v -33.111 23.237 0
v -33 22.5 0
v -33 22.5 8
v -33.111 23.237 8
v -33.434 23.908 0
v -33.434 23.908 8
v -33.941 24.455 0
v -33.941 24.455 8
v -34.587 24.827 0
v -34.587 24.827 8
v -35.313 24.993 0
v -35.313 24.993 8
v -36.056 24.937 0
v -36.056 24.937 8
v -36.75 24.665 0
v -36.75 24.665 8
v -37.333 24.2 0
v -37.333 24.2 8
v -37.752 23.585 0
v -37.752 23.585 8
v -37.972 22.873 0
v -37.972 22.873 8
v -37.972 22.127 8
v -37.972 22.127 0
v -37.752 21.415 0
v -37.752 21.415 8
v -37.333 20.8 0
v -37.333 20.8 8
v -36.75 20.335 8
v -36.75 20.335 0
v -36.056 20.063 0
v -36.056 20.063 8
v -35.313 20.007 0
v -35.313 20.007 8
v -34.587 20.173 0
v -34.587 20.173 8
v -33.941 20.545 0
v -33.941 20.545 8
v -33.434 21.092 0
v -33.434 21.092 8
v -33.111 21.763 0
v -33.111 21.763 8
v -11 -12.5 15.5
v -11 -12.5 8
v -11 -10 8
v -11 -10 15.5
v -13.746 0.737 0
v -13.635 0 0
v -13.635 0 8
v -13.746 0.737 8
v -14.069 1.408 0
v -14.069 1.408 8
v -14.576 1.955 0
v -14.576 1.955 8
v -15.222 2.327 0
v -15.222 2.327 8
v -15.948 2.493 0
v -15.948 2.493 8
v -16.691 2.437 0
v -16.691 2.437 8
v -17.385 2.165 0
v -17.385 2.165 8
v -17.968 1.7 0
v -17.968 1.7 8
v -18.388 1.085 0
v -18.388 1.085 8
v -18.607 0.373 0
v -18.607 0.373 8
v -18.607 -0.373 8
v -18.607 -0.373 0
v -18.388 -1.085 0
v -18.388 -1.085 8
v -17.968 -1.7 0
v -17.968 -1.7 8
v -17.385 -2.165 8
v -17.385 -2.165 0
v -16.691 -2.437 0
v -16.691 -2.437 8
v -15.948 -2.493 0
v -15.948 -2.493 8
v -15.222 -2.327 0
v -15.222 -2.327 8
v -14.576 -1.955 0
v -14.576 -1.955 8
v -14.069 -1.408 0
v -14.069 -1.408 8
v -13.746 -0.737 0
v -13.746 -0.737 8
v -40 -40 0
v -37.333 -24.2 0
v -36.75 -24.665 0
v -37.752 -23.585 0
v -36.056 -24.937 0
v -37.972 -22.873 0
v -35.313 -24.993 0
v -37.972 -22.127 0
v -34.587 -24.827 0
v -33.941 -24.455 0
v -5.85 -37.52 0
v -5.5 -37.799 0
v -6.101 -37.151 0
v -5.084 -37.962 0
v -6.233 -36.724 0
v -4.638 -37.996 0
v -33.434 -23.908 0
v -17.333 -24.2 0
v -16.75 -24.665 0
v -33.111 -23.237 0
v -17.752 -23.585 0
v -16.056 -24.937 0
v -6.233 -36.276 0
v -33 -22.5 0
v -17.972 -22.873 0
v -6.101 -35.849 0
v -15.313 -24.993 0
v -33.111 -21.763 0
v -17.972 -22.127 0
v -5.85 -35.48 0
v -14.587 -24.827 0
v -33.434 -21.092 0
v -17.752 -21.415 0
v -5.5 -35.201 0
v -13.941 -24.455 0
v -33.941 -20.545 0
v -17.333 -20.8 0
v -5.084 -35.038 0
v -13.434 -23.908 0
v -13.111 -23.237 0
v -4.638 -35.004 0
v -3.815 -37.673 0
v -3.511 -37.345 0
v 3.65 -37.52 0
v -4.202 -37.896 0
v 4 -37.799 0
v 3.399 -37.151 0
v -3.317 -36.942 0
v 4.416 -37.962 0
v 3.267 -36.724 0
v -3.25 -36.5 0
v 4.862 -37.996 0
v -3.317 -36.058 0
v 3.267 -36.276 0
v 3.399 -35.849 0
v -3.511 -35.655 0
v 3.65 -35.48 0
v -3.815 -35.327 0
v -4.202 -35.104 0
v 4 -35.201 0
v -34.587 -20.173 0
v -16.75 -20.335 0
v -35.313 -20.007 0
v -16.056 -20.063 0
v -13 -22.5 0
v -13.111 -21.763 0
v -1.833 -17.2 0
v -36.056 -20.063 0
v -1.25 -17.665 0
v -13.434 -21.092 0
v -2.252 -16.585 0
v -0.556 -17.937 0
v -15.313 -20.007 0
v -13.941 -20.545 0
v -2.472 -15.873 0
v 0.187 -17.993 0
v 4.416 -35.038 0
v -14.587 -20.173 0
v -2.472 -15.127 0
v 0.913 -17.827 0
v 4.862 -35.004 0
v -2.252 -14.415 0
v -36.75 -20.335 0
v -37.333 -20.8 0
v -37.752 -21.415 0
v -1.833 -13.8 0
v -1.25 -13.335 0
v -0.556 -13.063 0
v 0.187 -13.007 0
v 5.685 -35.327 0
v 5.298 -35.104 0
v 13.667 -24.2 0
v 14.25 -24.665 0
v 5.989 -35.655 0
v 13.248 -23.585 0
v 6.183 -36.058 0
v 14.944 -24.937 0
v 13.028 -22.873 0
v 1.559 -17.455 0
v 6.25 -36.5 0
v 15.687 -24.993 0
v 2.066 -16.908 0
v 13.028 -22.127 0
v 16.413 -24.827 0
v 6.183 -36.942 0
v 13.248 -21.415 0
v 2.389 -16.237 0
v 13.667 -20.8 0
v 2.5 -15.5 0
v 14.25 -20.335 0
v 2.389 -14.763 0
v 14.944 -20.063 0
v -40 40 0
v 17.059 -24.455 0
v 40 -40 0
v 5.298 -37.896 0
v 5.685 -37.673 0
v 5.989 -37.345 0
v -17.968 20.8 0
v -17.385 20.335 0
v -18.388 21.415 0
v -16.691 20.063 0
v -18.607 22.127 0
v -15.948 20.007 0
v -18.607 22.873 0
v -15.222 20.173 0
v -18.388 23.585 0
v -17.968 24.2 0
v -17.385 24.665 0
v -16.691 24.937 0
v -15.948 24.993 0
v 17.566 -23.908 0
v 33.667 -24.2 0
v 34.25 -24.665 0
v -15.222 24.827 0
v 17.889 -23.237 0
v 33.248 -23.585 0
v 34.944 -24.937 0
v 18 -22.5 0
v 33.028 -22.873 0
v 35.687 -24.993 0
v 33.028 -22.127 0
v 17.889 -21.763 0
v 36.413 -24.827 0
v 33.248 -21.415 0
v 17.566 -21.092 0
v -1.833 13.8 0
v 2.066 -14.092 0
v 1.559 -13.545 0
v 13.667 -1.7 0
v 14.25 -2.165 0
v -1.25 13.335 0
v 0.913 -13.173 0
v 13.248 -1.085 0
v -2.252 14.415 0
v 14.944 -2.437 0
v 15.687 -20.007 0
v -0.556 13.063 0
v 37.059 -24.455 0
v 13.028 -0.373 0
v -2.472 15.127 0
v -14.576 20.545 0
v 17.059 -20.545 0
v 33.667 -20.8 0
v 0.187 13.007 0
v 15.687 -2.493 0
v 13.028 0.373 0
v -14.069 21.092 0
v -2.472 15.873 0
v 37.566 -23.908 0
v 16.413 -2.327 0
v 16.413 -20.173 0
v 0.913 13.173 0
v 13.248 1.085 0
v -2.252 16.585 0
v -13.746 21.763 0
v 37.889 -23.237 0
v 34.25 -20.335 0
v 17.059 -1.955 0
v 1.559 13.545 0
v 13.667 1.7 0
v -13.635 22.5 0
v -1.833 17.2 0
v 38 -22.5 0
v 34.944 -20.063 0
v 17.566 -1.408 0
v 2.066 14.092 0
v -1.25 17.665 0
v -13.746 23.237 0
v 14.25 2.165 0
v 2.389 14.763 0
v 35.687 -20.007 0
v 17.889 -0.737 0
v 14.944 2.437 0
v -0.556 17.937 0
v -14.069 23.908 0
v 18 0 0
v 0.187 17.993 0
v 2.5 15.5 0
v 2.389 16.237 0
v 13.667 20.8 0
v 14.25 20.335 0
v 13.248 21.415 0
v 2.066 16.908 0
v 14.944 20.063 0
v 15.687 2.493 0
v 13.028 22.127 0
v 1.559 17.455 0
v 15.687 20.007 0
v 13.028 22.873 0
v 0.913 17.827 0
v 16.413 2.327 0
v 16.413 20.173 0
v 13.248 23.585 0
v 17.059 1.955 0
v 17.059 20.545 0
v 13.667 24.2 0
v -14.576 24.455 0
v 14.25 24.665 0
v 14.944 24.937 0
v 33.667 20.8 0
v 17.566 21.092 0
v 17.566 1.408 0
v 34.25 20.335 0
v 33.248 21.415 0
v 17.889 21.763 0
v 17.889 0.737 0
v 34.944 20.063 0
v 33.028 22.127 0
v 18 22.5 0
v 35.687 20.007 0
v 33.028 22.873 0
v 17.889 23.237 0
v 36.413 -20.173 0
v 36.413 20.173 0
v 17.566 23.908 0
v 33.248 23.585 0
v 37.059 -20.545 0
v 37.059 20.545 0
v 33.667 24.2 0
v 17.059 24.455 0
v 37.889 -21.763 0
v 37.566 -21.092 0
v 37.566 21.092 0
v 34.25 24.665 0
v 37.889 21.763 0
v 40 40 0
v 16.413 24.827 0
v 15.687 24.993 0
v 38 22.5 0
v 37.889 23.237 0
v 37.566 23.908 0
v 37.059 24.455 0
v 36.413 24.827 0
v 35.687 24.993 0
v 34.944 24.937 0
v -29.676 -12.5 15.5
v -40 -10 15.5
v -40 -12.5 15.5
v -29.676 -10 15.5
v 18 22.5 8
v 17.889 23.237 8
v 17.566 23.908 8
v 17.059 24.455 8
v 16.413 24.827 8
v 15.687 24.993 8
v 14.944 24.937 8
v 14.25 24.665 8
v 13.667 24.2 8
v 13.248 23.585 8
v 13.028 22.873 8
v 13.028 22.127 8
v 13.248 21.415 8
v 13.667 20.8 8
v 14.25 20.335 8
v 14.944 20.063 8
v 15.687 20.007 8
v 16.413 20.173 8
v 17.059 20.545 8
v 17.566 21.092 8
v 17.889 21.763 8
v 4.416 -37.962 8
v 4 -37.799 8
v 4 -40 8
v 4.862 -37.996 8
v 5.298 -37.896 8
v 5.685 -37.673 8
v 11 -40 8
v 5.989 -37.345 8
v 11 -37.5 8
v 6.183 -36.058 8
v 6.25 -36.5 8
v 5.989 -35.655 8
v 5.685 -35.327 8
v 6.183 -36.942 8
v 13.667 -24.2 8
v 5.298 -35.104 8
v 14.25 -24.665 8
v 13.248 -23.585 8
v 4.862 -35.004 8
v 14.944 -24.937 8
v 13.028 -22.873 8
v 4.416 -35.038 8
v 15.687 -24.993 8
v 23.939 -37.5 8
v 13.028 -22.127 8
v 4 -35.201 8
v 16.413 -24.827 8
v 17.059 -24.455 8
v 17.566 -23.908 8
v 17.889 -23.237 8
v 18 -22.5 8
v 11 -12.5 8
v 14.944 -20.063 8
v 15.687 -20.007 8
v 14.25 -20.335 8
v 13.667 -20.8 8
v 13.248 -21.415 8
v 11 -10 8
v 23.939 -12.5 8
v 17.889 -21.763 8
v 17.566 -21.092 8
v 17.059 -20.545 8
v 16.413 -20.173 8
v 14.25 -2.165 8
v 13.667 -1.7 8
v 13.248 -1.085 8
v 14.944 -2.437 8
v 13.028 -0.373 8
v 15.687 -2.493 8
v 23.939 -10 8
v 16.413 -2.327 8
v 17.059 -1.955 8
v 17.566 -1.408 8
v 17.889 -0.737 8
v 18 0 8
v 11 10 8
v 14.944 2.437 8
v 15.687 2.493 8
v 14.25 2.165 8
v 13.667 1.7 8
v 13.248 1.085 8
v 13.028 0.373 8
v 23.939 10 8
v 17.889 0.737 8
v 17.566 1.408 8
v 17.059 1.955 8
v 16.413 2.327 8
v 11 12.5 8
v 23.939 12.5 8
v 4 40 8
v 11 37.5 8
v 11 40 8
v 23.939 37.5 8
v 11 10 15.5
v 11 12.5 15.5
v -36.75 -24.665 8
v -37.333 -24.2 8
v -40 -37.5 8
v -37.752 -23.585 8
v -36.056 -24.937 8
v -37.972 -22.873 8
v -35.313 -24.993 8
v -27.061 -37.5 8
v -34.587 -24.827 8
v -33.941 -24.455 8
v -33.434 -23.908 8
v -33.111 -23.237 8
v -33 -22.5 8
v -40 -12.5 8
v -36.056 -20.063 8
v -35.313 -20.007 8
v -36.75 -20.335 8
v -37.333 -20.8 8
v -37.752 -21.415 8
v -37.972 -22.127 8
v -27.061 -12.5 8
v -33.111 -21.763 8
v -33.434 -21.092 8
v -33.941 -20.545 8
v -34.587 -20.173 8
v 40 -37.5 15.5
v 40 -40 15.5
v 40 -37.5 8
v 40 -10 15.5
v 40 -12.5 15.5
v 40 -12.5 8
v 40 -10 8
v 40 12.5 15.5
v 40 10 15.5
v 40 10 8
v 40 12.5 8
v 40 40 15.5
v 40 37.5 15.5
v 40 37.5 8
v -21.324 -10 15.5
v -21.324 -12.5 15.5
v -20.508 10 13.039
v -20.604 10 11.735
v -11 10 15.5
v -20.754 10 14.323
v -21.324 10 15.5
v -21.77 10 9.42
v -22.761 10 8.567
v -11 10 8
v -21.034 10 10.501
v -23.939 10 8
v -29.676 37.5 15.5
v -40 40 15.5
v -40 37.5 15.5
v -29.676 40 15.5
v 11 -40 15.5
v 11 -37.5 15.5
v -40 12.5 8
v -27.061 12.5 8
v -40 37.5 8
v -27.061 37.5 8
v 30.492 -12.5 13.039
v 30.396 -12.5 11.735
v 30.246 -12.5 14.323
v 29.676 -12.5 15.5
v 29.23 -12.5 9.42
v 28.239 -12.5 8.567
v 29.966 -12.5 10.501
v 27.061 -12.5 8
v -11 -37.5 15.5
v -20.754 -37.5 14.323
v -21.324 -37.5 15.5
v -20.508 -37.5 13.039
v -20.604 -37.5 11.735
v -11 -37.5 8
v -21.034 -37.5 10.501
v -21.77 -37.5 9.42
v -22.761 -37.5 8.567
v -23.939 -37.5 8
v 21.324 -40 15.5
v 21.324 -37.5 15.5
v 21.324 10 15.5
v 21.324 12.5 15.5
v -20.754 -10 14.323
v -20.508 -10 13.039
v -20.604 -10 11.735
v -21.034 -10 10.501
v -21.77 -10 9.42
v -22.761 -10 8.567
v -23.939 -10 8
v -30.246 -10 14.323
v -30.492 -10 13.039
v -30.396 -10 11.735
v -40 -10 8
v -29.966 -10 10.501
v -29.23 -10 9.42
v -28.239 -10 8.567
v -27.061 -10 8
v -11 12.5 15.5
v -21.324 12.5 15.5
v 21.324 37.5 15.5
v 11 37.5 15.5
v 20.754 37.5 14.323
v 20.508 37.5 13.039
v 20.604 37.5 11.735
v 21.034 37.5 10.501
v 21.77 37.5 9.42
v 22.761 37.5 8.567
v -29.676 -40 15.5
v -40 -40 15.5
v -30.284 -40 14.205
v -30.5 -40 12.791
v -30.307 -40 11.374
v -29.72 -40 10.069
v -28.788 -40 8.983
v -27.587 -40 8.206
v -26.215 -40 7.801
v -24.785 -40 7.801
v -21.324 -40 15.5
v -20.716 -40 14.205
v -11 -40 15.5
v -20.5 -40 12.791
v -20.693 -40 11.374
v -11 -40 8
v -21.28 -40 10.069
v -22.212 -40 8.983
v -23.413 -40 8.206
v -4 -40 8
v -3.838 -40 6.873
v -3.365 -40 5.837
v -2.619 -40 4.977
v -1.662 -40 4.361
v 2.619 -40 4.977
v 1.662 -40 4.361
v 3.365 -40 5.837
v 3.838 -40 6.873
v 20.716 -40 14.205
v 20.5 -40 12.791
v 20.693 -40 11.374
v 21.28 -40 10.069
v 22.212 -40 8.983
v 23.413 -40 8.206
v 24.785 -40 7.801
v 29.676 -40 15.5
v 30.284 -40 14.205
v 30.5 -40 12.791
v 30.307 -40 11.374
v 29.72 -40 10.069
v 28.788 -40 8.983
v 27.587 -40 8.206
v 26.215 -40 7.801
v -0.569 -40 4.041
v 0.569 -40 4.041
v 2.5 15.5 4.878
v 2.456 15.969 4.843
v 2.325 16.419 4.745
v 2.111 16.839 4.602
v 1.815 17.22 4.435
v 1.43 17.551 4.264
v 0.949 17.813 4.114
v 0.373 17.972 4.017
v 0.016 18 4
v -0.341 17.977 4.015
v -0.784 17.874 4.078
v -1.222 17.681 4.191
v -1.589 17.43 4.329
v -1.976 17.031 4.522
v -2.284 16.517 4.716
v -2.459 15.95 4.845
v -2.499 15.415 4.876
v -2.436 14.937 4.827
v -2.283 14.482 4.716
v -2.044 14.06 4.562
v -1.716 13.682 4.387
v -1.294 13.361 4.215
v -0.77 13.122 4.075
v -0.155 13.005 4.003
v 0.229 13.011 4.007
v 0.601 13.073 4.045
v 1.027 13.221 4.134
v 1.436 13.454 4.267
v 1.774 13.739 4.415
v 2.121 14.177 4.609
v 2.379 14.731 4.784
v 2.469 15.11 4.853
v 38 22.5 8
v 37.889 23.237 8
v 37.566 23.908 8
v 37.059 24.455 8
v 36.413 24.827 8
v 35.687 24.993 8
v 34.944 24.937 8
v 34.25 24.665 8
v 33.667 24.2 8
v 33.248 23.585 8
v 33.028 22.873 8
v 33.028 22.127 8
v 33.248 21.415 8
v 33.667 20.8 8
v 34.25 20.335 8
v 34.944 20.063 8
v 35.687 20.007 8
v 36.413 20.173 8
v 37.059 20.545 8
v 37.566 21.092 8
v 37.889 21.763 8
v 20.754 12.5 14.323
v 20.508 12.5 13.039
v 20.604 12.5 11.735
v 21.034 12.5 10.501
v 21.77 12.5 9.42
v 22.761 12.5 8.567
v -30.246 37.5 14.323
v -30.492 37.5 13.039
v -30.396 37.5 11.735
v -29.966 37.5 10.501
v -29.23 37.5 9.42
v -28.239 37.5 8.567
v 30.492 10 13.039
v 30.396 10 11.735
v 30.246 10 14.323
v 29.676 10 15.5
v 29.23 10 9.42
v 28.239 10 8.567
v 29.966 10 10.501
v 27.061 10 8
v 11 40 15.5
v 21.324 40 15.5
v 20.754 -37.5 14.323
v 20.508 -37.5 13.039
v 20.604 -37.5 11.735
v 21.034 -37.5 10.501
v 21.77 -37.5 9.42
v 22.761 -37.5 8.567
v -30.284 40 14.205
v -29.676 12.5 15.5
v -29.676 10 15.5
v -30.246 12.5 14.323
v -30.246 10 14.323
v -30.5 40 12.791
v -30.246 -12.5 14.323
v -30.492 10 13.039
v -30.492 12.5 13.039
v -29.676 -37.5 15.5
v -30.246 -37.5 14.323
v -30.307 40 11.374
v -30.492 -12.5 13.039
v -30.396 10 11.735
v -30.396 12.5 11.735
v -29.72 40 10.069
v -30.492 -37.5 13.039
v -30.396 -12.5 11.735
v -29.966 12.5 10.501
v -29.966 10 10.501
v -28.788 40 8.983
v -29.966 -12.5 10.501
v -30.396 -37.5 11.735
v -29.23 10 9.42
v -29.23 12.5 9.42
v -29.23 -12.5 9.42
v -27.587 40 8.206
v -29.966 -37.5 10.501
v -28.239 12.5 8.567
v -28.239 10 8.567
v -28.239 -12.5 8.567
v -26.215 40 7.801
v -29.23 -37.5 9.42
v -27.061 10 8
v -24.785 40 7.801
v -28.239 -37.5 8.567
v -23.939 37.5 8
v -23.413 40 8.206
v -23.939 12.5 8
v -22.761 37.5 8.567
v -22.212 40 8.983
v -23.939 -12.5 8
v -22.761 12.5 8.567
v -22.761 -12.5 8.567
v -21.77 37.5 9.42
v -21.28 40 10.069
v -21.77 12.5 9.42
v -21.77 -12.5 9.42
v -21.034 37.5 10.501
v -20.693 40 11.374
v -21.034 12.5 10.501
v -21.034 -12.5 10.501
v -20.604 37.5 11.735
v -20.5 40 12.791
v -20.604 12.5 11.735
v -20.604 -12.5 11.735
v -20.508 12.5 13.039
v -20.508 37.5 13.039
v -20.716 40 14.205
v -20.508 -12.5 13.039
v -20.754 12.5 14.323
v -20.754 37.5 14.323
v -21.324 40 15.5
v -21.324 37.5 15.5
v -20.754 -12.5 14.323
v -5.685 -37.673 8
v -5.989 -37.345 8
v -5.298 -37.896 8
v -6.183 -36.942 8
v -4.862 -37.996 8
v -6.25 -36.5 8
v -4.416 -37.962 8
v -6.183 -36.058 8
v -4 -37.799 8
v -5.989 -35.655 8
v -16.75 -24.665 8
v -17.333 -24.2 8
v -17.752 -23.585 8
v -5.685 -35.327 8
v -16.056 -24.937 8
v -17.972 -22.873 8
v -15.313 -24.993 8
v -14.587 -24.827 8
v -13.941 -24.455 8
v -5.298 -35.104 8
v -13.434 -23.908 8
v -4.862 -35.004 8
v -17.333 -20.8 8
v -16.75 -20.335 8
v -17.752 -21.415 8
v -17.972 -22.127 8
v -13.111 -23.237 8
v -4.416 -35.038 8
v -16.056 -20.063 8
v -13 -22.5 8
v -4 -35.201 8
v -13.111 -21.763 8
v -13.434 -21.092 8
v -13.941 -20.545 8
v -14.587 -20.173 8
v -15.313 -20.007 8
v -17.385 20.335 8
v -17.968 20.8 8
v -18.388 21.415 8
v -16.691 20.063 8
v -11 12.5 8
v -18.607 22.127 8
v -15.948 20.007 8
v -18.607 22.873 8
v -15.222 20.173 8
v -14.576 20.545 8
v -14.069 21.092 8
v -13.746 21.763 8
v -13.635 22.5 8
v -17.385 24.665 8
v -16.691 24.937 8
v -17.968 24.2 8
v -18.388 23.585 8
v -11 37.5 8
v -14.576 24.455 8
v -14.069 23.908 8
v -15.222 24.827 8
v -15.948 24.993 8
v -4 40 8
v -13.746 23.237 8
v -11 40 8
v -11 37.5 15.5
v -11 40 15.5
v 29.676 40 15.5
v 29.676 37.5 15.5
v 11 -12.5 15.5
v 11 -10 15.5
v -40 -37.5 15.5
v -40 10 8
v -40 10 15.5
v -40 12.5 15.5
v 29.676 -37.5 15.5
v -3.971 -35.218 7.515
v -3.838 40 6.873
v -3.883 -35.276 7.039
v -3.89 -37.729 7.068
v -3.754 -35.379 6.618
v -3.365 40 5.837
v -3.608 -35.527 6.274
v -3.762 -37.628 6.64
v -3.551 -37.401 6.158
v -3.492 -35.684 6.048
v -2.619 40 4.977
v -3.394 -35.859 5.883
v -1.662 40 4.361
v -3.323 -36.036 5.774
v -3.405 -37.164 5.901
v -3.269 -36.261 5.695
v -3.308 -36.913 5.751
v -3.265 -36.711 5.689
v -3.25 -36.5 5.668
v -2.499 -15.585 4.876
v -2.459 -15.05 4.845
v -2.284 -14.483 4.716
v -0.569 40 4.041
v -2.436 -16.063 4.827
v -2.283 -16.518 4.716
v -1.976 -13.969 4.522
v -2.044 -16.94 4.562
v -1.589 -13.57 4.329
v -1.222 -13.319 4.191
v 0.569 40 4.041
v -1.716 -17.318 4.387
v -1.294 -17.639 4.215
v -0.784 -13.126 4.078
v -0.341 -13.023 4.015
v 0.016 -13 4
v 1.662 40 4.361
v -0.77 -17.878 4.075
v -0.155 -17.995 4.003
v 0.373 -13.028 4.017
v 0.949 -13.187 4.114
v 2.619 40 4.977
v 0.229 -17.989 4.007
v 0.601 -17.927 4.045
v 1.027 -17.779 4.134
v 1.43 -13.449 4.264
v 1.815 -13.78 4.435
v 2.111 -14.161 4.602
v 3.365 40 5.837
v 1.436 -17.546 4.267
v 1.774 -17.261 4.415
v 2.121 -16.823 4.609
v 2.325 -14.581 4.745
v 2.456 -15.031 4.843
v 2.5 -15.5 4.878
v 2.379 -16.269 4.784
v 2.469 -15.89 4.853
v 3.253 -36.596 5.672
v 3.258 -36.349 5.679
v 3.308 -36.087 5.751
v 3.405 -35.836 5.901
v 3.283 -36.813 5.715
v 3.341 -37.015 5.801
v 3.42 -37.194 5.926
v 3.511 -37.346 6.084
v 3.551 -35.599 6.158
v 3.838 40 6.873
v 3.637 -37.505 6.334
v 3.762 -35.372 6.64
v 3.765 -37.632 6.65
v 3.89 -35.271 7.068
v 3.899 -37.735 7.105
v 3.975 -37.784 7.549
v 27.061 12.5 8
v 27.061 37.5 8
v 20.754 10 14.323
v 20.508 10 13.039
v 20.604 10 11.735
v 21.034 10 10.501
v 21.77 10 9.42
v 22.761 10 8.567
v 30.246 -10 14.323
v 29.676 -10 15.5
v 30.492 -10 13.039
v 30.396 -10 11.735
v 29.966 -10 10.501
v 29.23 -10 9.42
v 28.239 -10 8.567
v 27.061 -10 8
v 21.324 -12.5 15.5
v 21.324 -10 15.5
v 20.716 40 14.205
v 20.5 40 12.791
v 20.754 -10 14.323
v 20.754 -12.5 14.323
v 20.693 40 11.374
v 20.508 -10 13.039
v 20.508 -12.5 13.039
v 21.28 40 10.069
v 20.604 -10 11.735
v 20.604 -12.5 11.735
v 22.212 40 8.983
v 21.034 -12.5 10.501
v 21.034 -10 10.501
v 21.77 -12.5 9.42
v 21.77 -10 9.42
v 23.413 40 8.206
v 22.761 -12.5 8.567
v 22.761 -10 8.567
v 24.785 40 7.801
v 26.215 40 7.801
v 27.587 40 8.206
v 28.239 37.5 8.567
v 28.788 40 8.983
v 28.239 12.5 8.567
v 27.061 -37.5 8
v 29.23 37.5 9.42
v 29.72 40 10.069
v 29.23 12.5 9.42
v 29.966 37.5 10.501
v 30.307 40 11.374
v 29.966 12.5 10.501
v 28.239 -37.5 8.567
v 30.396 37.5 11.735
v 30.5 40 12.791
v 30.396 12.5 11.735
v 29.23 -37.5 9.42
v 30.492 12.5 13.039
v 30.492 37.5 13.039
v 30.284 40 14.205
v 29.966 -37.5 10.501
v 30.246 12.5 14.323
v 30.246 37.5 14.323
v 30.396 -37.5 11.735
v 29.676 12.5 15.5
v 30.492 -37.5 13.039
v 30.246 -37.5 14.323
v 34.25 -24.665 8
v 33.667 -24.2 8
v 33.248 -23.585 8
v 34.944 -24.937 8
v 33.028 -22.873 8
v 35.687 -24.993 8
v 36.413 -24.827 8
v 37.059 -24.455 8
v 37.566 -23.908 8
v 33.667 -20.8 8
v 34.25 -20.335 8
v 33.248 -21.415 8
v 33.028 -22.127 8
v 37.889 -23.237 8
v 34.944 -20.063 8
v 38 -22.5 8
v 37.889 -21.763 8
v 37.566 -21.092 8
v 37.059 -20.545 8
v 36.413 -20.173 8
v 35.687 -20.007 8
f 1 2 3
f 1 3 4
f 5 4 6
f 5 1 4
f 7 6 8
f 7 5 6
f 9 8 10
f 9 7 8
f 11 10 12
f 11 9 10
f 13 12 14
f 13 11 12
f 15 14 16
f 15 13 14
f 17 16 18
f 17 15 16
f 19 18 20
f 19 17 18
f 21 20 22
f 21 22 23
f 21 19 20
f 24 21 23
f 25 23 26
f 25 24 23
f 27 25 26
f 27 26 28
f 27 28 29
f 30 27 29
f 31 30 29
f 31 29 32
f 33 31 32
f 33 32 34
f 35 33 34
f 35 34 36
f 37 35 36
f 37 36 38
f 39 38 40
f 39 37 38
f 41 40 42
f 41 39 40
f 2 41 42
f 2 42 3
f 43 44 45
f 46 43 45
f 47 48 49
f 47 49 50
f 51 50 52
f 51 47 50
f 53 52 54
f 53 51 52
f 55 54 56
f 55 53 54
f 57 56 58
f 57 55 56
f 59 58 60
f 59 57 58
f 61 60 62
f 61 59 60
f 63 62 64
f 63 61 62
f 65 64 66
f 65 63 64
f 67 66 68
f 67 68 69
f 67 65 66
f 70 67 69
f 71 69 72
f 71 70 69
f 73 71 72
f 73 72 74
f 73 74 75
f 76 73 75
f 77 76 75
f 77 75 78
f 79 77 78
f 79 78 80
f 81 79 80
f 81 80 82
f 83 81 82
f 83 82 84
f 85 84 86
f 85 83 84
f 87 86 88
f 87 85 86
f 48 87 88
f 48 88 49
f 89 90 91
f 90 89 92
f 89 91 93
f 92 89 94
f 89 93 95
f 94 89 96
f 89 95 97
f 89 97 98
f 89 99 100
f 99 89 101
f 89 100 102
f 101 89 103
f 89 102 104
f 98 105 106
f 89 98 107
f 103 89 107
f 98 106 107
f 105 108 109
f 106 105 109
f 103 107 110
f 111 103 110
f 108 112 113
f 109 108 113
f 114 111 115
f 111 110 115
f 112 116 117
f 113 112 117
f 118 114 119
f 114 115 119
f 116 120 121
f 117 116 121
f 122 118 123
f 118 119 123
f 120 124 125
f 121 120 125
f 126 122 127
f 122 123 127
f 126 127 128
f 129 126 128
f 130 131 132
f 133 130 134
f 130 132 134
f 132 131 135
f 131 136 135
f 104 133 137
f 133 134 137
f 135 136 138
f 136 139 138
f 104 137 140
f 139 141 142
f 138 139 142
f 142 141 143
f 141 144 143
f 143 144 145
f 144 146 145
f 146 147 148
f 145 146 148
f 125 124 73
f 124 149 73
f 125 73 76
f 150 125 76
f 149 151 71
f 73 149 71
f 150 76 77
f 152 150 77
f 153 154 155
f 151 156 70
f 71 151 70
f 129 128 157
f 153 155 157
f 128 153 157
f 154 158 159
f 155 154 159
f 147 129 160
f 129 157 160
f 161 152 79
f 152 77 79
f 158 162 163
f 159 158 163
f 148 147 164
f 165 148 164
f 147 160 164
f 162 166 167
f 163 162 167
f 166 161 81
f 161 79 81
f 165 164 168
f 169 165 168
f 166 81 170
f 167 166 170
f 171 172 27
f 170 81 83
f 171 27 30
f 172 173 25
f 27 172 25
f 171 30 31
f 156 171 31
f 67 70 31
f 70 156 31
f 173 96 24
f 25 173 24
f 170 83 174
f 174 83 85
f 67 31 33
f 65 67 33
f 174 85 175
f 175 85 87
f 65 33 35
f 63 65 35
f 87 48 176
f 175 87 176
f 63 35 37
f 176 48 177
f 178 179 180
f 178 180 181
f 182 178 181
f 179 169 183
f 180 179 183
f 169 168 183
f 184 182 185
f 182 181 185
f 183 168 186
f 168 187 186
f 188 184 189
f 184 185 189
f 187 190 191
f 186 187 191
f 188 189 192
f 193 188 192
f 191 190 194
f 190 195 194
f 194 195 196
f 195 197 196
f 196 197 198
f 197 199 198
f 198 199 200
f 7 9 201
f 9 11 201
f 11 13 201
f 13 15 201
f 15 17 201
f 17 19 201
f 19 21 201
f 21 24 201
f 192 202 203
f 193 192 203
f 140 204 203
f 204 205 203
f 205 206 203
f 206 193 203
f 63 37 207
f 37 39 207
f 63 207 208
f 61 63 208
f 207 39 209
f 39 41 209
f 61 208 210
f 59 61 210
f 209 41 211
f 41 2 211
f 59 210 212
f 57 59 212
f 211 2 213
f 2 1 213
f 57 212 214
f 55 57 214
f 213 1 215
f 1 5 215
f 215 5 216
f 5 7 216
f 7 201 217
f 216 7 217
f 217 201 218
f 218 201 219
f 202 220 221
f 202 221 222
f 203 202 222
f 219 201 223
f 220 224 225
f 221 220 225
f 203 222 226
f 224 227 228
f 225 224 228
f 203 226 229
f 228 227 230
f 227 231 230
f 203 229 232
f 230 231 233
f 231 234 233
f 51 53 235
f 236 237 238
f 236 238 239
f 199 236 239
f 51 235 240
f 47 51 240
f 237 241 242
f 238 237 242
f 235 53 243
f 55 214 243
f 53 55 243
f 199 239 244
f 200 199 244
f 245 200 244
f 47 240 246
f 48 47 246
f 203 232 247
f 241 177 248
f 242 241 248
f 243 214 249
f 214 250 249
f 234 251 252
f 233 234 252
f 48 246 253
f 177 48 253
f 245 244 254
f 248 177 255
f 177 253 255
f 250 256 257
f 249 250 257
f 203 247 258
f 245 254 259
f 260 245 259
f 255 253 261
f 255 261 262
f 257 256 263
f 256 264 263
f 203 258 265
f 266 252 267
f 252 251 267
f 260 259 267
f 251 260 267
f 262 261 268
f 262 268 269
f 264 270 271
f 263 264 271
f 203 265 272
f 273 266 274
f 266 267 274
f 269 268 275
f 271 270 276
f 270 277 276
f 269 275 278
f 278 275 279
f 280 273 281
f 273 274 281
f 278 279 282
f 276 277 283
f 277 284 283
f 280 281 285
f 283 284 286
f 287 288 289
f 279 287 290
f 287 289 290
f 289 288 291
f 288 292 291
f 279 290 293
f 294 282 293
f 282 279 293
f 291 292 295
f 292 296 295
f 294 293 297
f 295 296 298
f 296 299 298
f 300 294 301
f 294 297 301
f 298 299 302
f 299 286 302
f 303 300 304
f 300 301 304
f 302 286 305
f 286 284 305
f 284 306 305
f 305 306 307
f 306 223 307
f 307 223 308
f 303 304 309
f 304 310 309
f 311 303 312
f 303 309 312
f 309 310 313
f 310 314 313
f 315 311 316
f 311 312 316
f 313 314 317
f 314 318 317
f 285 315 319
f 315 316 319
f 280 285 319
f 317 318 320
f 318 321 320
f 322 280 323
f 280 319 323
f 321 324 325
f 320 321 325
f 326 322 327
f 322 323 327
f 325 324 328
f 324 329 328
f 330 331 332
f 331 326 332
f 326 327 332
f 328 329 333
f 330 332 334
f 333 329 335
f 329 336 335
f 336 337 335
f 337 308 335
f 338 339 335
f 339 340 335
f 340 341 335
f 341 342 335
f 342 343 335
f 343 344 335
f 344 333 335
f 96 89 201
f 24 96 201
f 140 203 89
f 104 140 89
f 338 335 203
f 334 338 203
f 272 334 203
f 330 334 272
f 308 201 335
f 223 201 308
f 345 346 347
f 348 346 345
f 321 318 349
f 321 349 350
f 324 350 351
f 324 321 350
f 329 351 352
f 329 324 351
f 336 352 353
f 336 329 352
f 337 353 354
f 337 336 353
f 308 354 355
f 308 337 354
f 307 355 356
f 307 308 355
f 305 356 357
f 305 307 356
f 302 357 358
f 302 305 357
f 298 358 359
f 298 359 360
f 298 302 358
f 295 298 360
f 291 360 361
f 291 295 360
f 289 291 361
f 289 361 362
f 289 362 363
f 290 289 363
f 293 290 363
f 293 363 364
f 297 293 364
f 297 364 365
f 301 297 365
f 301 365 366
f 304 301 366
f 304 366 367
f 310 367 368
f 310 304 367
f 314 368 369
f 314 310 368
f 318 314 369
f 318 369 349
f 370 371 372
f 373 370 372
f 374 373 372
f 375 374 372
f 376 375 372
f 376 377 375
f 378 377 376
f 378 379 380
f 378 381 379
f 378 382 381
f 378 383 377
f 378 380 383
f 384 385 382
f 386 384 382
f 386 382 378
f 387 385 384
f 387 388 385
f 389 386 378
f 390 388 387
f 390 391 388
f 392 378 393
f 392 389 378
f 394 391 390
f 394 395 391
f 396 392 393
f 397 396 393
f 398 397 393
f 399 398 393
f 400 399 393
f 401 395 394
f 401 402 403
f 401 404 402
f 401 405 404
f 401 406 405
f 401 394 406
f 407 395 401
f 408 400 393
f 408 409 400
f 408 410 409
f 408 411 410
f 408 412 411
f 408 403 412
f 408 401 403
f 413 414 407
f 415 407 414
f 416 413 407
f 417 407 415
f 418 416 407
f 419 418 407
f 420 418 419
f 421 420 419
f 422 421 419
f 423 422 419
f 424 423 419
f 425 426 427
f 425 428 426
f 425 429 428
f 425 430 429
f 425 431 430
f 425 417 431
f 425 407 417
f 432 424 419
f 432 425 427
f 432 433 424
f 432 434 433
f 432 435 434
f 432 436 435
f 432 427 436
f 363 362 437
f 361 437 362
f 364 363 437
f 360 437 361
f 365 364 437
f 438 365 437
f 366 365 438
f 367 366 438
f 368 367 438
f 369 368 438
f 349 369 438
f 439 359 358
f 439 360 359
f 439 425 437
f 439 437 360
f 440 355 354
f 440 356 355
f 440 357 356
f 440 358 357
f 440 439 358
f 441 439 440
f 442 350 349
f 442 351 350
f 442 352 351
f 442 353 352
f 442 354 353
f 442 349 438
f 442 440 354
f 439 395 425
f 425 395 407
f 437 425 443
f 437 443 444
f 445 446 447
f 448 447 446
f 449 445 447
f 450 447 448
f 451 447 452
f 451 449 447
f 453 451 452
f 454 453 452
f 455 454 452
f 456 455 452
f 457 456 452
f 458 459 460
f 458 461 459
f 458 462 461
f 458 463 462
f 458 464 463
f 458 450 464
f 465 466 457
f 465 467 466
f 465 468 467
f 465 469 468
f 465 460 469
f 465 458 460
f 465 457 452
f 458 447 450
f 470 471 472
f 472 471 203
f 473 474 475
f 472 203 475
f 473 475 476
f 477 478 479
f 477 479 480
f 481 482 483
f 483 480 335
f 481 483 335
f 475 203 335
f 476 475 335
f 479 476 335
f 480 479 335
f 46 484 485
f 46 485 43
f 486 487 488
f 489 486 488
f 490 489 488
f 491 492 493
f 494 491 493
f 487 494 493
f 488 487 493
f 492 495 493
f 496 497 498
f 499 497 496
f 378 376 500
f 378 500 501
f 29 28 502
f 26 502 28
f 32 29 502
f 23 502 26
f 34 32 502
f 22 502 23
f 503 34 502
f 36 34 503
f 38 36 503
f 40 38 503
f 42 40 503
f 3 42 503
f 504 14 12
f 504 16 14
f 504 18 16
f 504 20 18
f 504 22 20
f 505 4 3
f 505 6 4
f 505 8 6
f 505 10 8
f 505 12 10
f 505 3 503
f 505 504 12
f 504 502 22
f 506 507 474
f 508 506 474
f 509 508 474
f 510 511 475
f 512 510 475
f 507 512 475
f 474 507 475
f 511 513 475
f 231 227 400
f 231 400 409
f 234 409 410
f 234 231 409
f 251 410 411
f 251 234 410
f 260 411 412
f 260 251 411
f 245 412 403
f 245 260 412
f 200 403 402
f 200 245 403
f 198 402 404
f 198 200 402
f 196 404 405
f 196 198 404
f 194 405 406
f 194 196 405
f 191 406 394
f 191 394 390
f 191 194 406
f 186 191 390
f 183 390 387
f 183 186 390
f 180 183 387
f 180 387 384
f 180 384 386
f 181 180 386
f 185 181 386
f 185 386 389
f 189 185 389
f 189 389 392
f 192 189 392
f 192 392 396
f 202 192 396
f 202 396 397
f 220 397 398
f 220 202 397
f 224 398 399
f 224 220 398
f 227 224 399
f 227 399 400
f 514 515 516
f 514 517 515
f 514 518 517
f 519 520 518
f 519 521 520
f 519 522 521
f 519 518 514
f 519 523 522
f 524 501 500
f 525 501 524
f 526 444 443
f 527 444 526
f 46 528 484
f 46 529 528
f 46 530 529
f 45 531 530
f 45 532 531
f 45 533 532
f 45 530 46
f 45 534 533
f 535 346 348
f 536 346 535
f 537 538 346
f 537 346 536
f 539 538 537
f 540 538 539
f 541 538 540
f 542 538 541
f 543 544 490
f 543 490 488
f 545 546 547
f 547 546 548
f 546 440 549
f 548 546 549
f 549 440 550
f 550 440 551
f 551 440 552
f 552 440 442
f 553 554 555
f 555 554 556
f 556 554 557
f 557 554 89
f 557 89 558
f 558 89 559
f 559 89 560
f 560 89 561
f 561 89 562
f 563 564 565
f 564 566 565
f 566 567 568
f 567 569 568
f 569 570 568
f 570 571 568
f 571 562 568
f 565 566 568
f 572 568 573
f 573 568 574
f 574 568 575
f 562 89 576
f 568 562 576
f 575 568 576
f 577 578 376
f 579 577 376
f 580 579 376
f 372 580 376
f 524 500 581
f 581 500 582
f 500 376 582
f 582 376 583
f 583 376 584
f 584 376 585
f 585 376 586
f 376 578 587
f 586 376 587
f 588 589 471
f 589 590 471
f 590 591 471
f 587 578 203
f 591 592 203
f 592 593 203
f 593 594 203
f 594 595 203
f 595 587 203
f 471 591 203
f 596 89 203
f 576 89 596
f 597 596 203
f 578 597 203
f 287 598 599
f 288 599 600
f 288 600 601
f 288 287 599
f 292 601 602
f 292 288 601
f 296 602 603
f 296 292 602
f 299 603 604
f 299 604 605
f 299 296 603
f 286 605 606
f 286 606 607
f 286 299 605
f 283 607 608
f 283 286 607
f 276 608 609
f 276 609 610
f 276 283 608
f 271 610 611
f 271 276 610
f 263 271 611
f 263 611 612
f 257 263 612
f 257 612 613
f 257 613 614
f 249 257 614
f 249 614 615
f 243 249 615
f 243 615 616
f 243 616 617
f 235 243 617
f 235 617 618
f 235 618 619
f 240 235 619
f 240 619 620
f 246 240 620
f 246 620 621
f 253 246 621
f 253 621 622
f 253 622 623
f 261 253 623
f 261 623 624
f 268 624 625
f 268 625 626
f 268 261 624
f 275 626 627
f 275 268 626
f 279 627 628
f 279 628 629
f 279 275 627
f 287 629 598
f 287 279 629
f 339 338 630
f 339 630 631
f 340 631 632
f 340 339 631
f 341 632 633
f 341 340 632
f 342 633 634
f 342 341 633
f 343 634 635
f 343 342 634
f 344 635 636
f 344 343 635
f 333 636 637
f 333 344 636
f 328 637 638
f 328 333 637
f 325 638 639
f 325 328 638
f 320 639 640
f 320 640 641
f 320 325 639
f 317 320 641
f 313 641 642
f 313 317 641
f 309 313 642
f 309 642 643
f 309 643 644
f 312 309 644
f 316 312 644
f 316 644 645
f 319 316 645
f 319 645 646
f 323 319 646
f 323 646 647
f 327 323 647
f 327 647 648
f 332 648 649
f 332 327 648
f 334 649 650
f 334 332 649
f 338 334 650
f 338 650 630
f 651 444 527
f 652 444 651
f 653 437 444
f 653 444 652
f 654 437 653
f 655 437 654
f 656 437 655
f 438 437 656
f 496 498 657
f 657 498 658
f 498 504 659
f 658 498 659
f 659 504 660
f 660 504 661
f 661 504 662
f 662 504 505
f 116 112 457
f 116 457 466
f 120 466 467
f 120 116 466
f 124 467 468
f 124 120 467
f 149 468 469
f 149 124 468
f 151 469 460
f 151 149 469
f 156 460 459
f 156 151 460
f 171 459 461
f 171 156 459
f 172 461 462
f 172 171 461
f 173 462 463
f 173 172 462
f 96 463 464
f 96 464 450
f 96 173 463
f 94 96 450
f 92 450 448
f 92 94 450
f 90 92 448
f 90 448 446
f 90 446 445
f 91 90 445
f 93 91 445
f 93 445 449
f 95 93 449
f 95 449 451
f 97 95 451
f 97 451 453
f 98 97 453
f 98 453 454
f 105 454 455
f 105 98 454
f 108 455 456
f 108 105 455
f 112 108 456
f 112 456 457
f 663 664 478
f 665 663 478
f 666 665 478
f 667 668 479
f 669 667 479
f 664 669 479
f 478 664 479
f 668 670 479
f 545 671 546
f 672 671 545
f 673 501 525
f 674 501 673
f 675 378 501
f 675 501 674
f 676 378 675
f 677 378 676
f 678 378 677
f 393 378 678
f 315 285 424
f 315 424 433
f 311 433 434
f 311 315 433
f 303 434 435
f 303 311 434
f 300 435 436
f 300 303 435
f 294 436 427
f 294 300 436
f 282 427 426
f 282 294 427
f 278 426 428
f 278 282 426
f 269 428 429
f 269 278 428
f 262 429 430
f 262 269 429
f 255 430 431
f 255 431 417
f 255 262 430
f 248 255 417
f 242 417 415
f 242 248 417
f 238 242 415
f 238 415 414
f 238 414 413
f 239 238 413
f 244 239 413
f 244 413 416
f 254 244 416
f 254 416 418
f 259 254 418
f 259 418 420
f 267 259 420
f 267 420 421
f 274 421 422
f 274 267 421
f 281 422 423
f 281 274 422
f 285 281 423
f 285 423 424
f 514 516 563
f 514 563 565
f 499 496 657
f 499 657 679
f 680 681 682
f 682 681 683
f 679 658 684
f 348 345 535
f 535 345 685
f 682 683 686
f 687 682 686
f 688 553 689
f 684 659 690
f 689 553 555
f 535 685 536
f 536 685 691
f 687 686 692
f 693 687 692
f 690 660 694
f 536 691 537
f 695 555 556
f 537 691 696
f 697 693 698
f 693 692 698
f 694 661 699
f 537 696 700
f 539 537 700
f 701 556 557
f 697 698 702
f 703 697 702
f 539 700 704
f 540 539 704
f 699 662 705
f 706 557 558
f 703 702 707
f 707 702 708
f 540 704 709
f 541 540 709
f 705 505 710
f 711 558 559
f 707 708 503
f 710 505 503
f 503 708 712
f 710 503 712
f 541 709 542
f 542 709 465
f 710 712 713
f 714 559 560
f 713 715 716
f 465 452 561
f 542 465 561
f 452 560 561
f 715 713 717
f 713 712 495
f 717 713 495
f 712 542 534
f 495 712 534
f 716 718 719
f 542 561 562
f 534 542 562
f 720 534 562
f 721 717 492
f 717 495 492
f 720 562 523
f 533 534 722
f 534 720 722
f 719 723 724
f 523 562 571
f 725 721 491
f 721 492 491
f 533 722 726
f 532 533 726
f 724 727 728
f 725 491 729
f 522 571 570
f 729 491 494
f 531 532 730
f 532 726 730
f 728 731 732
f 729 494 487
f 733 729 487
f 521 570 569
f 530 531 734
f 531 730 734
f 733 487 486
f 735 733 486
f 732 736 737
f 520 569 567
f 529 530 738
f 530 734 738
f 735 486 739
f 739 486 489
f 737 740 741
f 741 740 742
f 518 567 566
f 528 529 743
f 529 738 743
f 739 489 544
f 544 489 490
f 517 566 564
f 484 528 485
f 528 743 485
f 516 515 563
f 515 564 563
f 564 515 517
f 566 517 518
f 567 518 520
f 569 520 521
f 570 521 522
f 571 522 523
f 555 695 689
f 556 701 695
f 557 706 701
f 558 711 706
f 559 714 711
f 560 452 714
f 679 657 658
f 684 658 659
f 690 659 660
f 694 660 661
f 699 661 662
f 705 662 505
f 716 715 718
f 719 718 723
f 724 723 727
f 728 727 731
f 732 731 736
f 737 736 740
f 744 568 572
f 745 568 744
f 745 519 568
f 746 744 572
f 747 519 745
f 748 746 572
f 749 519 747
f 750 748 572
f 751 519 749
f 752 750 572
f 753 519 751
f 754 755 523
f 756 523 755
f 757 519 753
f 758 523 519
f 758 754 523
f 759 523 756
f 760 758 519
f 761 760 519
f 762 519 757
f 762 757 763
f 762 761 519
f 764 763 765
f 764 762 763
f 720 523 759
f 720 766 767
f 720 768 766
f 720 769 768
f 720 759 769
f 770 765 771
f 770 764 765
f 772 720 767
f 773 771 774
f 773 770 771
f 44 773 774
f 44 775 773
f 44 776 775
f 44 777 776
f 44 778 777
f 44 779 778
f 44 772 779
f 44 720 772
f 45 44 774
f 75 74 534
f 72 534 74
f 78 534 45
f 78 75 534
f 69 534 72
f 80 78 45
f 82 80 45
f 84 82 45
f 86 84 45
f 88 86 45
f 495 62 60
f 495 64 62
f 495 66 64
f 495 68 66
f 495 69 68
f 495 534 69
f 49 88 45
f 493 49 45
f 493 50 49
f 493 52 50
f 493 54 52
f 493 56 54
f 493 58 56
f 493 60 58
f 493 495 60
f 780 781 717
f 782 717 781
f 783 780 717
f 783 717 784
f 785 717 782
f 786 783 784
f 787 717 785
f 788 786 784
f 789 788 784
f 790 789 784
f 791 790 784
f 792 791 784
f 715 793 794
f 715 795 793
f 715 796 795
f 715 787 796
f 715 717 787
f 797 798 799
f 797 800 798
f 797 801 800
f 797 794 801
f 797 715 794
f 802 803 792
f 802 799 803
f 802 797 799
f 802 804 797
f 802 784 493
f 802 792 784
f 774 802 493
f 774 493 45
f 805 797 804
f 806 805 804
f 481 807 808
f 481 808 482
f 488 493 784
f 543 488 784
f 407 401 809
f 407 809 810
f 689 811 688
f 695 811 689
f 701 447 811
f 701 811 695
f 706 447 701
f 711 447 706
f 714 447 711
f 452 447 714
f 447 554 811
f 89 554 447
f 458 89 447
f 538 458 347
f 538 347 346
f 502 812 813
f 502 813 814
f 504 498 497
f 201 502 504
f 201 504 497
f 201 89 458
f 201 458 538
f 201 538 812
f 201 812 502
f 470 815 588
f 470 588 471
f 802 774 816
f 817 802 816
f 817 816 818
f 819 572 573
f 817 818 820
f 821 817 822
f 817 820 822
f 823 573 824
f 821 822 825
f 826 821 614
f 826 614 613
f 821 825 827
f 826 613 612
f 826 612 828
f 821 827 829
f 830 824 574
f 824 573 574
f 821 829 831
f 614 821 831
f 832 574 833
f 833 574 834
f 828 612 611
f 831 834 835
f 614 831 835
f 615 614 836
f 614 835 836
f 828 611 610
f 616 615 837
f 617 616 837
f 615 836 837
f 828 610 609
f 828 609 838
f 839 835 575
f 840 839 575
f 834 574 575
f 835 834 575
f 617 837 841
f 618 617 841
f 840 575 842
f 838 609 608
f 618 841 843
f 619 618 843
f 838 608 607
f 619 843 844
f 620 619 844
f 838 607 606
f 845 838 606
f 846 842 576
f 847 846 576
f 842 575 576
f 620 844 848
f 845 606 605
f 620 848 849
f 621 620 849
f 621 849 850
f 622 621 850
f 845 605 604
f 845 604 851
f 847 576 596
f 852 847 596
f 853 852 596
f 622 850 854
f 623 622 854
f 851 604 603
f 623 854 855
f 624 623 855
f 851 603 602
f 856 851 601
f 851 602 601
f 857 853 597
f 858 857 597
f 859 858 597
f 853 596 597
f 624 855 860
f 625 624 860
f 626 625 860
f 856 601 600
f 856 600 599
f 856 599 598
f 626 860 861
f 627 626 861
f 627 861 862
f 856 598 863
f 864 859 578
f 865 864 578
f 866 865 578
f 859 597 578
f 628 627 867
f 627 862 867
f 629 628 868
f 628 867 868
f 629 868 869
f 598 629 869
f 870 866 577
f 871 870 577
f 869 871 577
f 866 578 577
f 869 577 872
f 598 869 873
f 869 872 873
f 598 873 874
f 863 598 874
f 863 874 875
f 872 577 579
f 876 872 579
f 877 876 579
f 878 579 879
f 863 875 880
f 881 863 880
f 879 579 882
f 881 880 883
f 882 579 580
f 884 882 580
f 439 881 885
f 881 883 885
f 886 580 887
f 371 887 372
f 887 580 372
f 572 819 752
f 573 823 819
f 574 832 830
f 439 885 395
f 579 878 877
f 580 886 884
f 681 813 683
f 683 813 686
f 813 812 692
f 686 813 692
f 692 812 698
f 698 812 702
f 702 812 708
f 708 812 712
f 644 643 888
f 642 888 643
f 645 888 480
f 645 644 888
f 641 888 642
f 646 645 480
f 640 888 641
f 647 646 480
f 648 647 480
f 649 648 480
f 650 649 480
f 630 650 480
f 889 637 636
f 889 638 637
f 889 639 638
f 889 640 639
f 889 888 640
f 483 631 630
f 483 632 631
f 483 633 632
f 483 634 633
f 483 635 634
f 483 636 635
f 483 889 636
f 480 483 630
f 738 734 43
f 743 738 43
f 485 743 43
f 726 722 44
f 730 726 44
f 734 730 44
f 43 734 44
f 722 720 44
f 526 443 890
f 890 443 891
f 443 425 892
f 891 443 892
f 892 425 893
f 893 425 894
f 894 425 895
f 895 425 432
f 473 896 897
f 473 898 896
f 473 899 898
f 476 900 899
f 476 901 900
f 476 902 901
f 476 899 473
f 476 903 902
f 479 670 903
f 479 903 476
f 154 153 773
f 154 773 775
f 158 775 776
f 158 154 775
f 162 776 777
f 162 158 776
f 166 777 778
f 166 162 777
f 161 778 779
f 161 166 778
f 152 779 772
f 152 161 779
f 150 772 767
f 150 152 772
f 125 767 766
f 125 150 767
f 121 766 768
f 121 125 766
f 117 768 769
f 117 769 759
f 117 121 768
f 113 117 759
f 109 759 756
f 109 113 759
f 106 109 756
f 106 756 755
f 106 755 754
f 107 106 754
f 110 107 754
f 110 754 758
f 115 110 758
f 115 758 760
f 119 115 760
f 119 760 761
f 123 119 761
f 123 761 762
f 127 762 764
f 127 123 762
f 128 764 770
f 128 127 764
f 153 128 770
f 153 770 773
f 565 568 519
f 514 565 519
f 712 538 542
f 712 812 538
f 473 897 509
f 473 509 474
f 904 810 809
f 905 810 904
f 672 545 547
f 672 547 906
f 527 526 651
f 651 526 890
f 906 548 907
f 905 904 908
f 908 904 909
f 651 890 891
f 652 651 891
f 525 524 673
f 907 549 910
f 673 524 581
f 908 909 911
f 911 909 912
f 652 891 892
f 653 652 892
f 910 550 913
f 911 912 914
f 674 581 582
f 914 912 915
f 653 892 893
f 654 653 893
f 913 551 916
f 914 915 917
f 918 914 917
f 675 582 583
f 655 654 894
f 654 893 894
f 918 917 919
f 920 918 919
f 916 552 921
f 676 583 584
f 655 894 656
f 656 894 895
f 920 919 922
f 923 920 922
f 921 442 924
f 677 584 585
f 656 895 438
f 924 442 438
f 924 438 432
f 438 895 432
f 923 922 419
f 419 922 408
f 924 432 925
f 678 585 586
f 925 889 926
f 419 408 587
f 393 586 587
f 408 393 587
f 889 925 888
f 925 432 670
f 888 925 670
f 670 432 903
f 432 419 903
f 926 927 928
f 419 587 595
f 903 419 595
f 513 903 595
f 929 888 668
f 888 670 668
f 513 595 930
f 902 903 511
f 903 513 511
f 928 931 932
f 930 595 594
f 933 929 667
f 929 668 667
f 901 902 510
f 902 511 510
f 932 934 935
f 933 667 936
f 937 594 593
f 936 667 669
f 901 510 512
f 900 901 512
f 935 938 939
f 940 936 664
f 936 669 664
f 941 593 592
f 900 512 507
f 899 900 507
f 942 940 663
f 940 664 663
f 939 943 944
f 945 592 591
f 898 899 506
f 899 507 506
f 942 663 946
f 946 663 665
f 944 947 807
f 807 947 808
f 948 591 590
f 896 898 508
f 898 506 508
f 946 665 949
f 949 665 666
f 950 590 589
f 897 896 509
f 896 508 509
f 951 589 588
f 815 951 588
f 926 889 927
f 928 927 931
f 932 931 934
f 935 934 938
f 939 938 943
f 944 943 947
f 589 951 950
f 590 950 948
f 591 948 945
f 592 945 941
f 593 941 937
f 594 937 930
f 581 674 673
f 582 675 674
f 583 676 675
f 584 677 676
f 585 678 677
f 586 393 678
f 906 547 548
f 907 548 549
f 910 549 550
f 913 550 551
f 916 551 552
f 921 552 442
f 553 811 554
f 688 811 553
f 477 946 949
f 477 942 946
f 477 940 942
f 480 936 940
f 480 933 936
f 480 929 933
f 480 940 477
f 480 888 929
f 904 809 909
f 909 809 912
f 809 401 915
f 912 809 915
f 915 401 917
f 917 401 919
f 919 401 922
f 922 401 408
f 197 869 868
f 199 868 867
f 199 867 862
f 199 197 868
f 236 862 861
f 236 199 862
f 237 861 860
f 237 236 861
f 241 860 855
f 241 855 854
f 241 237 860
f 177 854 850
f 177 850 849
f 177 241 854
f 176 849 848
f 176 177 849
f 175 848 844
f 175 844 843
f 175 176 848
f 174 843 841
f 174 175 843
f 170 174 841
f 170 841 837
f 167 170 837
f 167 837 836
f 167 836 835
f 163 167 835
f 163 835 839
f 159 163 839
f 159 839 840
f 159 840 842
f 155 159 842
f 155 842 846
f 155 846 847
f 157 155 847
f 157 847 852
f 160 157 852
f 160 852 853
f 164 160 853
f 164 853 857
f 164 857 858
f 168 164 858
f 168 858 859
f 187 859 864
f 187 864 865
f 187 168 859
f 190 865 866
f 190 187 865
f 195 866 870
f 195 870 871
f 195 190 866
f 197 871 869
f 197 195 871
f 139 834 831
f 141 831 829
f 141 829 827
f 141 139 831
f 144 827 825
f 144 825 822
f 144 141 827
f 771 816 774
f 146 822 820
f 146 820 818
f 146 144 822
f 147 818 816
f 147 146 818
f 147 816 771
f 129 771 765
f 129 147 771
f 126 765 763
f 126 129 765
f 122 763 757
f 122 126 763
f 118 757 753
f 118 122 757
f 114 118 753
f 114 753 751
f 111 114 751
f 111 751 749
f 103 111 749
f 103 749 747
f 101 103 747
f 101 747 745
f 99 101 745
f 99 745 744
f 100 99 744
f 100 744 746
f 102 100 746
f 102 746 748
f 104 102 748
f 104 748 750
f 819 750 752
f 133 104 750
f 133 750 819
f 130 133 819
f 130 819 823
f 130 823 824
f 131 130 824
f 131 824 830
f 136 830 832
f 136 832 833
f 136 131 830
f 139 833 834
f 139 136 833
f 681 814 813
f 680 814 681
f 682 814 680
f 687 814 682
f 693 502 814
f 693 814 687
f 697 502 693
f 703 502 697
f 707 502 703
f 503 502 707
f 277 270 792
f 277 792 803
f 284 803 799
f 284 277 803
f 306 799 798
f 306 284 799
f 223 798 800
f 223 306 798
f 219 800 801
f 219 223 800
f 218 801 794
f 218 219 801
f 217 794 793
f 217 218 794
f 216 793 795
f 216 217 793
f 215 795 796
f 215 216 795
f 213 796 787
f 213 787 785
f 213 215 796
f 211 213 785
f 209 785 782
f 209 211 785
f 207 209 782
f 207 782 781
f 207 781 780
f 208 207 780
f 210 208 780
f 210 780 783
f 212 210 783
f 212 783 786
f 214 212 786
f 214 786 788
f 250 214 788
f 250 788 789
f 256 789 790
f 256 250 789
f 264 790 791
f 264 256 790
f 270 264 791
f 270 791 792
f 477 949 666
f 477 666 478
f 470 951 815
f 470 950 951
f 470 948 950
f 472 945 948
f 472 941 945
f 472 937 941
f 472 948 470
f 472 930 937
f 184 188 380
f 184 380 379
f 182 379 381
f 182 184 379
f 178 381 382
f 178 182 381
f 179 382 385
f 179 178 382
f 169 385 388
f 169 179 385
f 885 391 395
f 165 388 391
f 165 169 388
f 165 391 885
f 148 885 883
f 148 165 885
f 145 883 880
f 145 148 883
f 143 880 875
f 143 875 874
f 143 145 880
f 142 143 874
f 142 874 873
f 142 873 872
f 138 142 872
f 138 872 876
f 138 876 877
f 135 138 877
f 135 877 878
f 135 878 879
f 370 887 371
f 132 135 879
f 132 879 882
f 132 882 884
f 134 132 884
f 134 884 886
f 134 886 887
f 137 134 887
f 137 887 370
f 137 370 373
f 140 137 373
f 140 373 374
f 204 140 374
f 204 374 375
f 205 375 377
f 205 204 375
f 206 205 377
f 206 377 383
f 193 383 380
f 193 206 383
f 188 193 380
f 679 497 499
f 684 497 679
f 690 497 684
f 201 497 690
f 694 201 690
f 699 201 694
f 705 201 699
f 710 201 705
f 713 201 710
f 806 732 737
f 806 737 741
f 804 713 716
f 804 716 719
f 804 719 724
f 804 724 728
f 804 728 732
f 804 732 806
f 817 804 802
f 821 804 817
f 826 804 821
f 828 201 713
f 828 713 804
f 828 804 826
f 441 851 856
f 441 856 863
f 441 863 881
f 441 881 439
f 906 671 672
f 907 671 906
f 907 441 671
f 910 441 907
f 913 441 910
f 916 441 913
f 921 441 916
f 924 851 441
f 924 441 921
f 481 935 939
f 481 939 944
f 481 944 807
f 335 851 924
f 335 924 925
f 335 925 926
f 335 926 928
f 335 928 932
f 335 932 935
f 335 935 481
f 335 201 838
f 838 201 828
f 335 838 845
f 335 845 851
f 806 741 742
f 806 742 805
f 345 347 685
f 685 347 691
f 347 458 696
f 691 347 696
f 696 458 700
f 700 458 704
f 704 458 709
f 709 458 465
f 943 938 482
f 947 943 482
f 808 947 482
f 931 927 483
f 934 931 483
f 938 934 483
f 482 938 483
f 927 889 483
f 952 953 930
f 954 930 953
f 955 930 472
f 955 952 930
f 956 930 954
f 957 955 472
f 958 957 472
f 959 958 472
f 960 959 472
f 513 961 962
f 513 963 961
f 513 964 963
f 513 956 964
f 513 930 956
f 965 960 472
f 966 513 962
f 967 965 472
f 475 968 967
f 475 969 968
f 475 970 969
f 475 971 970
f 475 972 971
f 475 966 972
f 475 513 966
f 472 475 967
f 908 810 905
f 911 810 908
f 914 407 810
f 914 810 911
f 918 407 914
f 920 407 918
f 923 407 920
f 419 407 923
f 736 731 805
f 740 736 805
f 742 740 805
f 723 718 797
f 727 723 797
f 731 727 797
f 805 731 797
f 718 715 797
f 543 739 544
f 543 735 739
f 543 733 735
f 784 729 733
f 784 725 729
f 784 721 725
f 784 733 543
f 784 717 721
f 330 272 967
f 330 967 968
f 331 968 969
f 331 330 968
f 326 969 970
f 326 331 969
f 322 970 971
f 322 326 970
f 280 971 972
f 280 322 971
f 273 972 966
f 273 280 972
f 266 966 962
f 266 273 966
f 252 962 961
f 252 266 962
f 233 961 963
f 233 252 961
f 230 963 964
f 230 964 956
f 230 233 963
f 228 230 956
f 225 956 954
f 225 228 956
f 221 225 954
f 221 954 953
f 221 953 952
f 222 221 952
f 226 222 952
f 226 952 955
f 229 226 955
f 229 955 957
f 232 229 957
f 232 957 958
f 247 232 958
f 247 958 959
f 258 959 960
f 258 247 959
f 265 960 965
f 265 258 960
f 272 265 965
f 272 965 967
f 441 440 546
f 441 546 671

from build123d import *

# Parameters (mm, degrees)
F0_W     = 80
F0_H     = 80
F0_R     = 2.5
F0_R_2   = 1.5
F1_DEPTH = 8
F2_W     = 29
F2_H     = 2.5
F3_DEPTH = 7.5
F5_D     = 10
F7_D     = 8


with BuildPart() as f1:
    # F0 (on Top) → F1 (new body)
    with BuildSketch(Plane.XY):
        Rectangle(F0_W, F0_H)
        with Locations((-35.5, -22.5)):
            Circle(F0_R, mode=Mode.SUBTRACT)
        with Locations((-4.75, -36.5)):
            Circle(F0_R_2, mode=Mode.SUBTRACT)
        with Locations((-15.5, -22.5)):
            Circle(F0_R, mode=Mode.SUBTRACT)
        with Locations((4.75, -36.5)):
            Circle(F0_R_2, mode=Mode.SUBTRACT)
        with Locations((15.5, -22.5)):
            Circle(F0_R, mode=Mode.SUBTRACT)
        with Locations((35.5, -22.5)):
            Circle(F0_R, mode=Mode.SUBTRACT)
        with Locations((0, -15.5)):
            Circle(F0_R, mode=Mode.SUBTRACT)
        with Locations((-16.135083, 0)):
            Circle(F0_R, mode=Mode.SUBTRACT)
        with Locations((-35.5, 22.5)):
            Circle(F0_R, mode=Mode.SUBTRACT)
        with Locations((-16.135083, 22.5)):
            Circle(F0_R, mode=Mode.SUBTRACT)
        with Locations((15.5, 0)):
            Circle(F0_R, mode=Mode.SUBTRACT)
        with Locations((0, 15.5)):
            Circle(F0_R, mode=Mode.SUBTRACT)
        with Locations((15.5, 22.5)):
            Circle(F0_R, mode=Mode.SUBTRACT)
        with Locations((35.5, 22.5)):
            Circle(F0_R, mode=Mode.SUBTRACT)
    extrude(amount=F1_DEPTH)

    # F2 (on face) → F3 (join)
    with BuildSketch(Plane.XY.offset(8)):
        with Locations((-25.5, 38.75)):
            Rectangle(F2_W, F2_H)
        with Locations((25.5, 38.75)):
            Rectangle(F2_W, F2_H)
        with Locations((-25.5, -38.75)):
            Rectangle(F2_W, F2_H)
        with Locations((25.5, -38.75)):
            Rectangle(F2_W, F2_H)
        with Locations((-25.5, -11.25)):
            Rectangle(F2_W, F2_H)
        with Locations((25.5, -11.25)):
            Rectangle(F2_W, F2_H)
        with Locations((-25.5, 11.25)):
            Rectangle(F2_W, F2_H)
        with Locations((25.5, 11.25)):
            Rectangle(F2_W, F2_H)
    extrude(amount=F3_DEPTH)

    # F5 (through all)
    with Locations(Plane(origin=(0, 40, 0), x_dir=(-1, 0, 0), z_dir=(0, 1, 0))):
        with Locations((-25.5, 12.75), (25.5, 12.75)):
            Hole(F5_D / 2)

    # F7 (through all)
    with Locations(Plane(origin=(0, 40, 0), x_dir=(-1, 0, 0), z_dir=(0, 1, 0))):
        with Locations((0, 8)):
            Hole(F7_D / 2)


solid = f1.part
